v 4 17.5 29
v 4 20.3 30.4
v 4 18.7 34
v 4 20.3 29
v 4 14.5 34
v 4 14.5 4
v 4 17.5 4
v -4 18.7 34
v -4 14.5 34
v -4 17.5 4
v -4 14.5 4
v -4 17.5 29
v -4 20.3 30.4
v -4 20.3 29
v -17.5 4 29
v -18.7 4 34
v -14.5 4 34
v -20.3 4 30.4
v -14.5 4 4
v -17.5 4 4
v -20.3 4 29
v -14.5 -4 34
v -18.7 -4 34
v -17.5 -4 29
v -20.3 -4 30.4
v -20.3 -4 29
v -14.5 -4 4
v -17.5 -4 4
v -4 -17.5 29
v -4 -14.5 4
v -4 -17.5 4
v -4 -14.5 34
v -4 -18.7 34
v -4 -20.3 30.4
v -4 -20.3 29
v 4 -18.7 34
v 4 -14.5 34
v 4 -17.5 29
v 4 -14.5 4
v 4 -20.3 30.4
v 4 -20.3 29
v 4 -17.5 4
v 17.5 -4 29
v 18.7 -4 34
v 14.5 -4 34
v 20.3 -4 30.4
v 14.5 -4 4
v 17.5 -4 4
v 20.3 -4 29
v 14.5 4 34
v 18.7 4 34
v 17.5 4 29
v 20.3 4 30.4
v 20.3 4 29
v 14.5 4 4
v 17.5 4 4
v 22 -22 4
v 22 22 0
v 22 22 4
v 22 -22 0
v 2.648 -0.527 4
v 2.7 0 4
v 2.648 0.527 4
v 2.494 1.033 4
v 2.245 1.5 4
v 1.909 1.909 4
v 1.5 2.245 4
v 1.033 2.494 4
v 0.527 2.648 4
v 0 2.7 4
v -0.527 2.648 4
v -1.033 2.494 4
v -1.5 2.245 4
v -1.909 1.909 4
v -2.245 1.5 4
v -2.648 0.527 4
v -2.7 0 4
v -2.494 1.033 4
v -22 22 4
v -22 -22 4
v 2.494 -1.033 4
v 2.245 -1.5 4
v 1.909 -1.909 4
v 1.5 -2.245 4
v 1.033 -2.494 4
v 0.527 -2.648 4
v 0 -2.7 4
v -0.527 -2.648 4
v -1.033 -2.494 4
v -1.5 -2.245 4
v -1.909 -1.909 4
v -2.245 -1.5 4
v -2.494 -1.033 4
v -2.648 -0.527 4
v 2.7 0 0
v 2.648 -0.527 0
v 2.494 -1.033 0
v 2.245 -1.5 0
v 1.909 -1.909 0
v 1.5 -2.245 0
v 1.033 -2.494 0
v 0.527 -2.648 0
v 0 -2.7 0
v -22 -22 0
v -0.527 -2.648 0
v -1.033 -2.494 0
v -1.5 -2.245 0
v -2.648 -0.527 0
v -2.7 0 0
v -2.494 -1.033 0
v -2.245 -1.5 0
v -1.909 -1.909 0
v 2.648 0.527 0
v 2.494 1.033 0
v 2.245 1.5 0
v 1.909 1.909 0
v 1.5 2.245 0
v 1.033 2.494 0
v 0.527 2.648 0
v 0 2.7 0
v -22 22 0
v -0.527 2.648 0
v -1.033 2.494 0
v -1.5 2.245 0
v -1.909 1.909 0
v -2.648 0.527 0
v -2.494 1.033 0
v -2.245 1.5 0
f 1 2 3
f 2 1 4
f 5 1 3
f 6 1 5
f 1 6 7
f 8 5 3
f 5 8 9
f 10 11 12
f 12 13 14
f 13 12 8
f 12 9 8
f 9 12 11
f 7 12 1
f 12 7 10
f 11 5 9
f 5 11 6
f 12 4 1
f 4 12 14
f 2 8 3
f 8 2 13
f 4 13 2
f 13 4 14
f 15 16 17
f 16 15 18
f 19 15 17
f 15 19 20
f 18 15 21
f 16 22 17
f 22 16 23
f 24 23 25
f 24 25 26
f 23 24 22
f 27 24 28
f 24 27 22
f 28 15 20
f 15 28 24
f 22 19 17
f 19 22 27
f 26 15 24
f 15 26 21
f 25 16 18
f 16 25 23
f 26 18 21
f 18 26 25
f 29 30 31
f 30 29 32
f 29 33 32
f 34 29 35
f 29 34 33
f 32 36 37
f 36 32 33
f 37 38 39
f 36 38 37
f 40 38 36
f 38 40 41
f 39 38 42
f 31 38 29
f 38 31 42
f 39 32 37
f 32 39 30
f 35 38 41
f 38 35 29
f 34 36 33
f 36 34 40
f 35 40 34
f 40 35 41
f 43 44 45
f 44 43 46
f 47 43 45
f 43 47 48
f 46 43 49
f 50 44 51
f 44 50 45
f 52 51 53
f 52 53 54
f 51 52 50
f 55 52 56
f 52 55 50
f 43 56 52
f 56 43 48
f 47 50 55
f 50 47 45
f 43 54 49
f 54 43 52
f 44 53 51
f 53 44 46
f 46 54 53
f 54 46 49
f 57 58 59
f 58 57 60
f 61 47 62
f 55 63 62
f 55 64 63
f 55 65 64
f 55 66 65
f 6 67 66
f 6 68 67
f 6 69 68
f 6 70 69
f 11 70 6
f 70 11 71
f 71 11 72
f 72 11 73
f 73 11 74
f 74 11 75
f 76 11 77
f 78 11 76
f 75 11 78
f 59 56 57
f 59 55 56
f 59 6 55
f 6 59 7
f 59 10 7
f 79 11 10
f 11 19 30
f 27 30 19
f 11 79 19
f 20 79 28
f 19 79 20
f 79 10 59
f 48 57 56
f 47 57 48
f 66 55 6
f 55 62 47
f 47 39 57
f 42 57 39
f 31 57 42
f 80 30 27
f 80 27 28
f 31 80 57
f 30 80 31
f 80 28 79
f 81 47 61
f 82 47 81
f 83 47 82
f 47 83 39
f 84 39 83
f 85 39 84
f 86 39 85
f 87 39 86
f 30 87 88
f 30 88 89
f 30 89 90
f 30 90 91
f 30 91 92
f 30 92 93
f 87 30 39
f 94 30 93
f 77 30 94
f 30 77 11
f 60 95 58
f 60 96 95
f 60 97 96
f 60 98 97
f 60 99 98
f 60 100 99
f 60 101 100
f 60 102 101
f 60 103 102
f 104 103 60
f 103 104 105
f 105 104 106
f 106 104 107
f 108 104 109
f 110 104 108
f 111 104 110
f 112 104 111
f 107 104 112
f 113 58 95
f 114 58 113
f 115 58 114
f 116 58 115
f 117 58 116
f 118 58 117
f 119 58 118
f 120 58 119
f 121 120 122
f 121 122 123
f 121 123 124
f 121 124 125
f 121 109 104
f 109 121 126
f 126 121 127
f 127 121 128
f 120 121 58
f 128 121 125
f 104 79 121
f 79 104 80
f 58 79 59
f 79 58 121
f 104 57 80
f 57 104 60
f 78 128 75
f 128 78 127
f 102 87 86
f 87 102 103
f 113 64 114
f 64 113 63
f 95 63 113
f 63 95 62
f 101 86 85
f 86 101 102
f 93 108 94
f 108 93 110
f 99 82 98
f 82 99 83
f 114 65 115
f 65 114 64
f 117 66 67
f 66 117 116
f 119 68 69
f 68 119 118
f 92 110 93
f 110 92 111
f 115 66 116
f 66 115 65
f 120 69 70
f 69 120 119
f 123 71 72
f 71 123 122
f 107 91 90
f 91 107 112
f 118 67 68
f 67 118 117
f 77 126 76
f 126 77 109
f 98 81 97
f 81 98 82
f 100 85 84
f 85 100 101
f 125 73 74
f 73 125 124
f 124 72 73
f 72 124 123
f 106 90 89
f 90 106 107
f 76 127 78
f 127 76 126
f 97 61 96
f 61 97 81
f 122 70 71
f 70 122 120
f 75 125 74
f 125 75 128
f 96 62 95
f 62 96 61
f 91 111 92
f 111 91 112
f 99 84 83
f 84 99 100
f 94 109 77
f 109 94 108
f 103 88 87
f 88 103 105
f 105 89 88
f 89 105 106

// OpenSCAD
$fn = 32;

// ----------------------------------------------------------------------
// Snap-fit latch: 4 arms, 30 mm tall, 3 mm undercut hooks
// ----------------------------------------------------------------------

// --- parameters (mm) ---
base_d = 44;              // base plate depth
base_h = 4;               // base plate thickness
span = 32;                // distance between opposite arms
arm_t = 3;                // arm thickness
arm_d = 8;                // arm width
height = 30;              // free arm length
head_len = 3;             // hook reach
head_h = 5;               // hook height
lead = 1.4;               // lead-in ramp thickness
bore_d = 5.4;             // base fixing bore
top_z = 34;               // height of the arm tips above the base

arms = 4;

difference() {
  union() {
    /* base plate, centred on the arm ring */
    translate([-22, -22, 0]) cube([base_d, base_d, base_h]);
    for (a = [0 : 360 / arms : 359]) rotate([0, 0, a]) {
    /* arm, sunk 0.5 mm into the base */
    translate([-arm_d / 2, span / 2 - arm_t / 2, base_h - 0.5]) cube([arm_d, arm_t, height + 0.5]);
    /* hook: a convex hull of a tall inner block and a thin outer lip
       gives a flat undercut below and a lead-in ramp on top */
    hull() {
      translate([-arm_d / 2, span / 2 + arm_t / 2 - 0.6, top_z - head_h]) cube([arm_d, lead + 0.4, head_h]);
      translate([-arm_d / 2, span / 2 + arm_t / 2 - 0.2, top_z - head_h]) cube([arm_d, head_len, lead]);
    }
    }
  }
  translate([0, 0, -2.5]) cylinder(h = base_h + 5, d = bore_d);
}
